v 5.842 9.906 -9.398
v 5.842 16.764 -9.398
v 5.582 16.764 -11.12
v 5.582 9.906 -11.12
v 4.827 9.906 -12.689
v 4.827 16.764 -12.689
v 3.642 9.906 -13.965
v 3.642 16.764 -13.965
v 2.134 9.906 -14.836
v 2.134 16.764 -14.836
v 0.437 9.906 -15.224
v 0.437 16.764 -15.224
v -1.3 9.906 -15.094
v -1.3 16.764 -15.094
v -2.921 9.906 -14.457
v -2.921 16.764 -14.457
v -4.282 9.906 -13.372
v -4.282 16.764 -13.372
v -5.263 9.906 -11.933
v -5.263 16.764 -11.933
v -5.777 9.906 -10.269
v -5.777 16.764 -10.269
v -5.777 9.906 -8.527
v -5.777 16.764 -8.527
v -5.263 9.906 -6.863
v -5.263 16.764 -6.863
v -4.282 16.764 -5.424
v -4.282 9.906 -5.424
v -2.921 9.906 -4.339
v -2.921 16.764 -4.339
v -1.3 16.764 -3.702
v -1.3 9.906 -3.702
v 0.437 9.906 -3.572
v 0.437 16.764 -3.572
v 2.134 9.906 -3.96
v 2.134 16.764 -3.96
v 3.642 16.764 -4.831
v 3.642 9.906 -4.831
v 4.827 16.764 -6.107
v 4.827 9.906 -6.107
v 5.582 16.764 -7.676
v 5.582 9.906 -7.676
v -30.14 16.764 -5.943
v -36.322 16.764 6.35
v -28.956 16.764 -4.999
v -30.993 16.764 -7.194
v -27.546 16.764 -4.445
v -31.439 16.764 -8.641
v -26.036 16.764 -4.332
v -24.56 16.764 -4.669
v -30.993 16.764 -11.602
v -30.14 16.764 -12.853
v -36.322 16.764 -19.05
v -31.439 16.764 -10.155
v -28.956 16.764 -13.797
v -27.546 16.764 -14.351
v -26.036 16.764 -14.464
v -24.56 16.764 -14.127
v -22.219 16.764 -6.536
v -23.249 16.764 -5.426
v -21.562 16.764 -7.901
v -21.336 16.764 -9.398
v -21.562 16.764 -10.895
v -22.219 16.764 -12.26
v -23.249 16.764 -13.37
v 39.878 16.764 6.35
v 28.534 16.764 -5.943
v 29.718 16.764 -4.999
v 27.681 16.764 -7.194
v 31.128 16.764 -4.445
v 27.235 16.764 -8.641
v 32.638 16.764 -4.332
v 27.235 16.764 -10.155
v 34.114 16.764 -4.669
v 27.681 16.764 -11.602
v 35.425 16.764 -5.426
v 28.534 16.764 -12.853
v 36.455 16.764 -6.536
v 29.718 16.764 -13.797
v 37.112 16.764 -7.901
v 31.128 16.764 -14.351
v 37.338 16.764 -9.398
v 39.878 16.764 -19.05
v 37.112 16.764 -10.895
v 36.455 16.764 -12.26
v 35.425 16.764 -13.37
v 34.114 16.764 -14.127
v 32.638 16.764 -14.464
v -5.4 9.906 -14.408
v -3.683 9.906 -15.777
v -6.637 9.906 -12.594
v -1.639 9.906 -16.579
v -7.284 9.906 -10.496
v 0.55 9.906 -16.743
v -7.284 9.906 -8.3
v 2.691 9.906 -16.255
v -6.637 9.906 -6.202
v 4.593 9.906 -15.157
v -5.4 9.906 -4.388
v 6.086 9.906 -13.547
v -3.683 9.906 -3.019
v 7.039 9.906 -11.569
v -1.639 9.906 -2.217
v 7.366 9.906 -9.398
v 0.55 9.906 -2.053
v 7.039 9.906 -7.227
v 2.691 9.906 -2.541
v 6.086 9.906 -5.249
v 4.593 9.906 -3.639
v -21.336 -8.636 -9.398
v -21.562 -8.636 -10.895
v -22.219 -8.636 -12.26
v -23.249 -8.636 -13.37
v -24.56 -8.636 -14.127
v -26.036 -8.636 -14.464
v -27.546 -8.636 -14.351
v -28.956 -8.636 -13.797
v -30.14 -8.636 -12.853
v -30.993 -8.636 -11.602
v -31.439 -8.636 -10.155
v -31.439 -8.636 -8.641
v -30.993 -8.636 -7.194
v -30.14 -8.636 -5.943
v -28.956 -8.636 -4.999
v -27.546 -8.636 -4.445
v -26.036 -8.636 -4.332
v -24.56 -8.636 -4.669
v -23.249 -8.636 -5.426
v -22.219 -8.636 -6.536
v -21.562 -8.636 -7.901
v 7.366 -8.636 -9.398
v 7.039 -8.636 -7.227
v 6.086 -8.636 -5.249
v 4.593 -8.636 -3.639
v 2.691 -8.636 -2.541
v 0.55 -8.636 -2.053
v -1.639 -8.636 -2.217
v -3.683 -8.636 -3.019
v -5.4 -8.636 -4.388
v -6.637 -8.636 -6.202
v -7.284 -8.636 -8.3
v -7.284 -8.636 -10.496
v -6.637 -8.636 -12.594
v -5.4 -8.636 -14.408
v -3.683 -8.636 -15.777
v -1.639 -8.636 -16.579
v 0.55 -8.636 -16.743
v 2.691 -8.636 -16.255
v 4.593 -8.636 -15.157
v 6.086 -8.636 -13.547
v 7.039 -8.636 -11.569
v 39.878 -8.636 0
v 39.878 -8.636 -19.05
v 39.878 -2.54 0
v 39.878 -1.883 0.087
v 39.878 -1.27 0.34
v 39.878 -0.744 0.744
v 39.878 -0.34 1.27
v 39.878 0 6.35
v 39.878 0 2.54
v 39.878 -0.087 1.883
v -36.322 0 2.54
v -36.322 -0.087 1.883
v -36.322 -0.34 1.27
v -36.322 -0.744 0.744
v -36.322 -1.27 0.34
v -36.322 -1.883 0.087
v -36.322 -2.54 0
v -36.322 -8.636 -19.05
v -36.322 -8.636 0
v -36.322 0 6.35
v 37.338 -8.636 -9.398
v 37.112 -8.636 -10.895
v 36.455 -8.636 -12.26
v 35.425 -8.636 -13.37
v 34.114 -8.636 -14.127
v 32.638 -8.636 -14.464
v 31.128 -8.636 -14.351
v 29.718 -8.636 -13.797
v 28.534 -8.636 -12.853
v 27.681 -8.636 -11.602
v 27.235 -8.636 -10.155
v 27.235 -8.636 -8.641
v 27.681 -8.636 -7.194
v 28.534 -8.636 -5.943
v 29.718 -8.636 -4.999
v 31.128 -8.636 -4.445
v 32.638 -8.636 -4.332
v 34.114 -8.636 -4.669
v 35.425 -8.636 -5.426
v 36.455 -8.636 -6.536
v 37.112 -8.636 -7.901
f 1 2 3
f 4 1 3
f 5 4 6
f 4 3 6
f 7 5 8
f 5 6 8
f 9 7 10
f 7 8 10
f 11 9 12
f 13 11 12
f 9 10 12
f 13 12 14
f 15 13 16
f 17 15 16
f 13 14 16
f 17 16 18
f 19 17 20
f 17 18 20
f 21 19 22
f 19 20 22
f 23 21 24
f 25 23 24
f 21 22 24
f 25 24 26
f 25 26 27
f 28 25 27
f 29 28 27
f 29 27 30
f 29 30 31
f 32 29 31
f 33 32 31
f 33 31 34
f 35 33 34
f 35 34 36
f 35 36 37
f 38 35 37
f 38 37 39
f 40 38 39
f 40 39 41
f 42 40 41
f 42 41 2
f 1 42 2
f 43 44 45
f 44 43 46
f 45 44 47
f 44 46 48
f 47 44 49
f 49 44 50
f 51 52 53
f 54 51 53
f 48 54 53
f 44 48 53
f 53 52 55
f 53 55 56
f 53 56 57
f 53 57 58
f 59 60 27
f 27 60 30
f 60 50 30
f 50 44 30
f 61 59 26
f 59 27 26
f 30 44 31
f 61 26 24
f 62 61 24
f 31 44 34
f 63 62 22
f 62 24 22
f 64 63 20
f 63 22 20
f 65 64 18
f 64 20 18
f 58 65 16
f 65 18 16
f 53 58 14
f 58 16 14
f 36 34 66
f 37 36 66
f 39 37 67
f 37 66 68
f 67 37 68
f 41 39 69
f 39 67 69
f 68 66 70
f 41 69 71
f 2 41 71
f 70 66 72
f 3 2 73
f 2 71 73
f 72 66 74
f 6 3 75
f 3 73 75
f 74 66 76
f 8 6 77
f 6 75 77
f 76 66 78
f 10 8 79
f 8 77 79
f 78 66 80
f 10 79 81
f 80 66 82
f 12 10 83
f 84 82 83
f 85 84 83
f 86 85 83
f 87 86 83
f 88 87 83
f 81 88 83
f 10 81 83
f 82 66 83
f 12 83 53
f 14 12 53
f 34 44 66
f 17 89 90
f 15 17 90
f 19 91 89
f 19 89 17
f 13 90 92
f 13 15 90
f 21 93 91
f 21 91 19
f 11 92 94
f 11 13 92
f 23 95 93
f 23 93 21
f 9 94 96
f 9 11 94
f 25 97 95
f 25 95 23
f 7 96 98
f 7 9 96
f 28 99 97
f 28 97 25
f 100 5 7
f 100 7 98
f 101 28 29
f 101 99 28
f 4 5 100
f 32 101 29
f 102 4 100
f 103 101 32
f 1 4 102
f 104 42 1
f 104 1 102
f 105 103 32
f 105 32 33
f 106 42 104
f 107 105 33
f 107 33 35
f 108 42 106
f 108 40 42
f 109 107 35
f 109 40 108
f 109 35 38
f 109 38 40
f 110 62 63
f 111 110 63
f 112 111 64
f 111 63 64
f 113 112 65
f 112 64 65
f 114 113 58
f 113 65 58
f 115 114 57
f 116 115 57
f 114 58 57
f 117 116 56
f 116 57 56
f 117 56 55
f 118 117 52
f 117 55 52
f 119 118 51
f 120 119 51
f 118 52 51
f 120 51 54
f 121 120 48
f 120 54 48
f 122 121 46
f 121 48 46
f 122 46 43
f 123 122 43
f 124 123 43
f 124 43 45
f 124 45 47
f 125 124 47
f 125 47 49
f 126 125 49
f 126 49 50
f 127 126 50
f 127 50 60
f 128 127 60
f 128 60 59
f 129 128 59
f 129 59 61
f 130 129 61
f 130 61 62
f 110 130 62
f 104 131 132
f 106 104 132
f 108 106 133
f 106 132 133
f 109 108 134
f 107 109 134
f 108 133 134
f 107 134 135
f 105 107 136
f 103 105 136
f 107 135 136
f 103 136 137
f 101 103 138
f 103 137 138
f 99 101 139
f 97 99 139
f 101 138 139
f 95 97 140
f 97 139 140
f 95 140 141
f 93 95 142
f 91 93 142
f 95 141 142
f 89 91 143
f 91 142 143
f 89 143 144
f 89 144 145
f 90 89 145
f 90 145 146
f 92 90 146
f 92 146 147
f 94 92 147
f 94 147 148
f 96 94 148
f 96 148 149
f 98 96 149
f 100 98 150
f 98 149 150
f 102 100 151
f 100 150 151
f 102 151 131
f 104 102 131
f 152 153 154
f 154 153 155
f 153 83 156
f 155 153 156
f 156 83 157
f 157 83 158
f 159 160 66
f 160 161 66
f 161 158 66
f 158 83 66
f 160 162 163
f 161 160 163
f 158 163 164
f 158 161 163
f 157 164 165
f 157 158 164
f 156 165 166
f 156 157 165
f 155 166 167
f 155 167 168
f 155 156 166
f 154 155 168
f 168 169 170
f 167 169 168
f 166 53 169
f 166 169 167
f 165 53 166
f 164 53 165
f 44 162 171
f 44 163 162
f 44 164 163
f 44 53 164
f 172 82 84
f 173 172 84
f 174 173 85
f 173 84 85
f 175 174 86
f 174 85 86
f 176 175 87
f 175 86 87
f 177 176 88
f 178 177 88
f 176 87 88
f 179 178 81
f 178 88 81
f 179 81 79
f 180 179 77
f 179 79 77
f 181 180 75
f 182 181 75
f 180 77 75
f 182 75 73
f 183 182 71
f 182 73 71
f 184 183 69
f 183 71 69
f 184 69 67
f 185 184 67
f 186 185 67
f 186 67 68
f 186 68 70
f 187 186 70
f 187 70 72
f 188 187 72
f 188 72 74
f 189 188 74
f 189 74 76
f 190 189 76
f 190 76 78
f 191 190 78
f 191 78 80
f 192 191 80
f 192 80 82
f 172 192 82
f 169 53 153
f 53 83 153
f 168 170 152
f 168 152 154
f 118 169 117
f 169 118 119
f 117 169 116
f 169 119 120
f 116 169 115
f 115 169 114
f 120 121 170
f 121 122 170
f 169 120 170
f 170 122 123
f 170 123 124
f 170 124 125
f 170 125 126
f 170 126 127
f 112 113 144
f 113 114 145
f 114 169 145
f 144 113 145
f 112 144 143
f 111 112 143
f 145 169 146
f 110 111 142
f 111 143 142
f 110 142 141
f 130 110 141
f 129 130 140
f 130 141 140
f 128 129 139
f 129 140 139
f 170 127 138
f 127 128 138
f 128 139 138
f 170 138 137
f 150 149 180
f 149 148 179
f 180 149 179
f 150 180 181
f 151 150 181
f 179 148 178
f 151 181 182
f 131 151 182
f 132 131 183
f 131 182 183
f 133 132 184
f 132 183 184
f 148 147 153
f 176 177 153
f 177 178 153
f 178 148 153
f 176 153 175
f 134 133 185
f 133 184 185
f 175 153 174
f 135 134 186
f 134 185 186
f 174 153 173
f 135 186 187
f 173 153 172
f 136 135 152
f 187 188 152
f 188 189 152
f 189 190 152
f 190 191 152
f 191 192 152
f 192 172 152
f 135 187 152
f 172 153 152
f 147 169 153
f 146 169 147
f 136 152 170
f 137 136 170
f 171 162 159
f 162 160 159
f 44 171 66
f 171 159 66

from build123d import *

# Parameters (mm, degrees)
BOSS_EXTRUDE1_DEPTH      = 39.878
BOSS_EXTRUDE1_DEPTH_BACK = 36.322
FILLET1_R                = 2.54
SKETCH2_R                = 5.08
SKETCH2_R_2              = 5.842
CUT_EXTRUDE1_DEPTH       = 26.4
SKETCH3_R                = 7.366
CUT_EXTRUDE2_DEPTH       = 18.542


with BuildPart() as part:
    # Sketch1 → Boss-Extrude1 (new body, two sides)
    with BuildSketch(Plane(origin=(0, 0, 0), x_dir=(0, 0, -1), z_dir=(1, 0, 0))) as boss_extrude1_sk:
        Polygon((0, 0), (-6.35, 0), (-6.35, 16.764), (19.05, 16.764), (19.05, -8.636), (0, -8.636), align=None)
    extrude(amount=BOSS_EXTRUDE1_DEPTH)
    extrude(boss_extrude1_sk.sketch, amount=-BOSS_EXTRUDE1_DEPTH_BACK)

    # Fillet1
    fillet1_edges = [part.edges().sort_by_distance(p)[0] for p in [
        (1.778, 0, 0),
    ]]
    fillet(fillet1_edges, radius=FILLET1_R)

    # Sketch2 → Cut-Extrude1 (cut, through all)
    with BuildSketch(Plane(origin=(0, 16.764, 0), x_dir=(1, 0, 0), z_dir=(0, 1, 0))):
        with Locations((-26.416, 9.398)):
            Circle(SKETCH2_R)
        with Locations((32.258, 9.398)):
            Circle(SKETCH2_R)
        with Locations((0, 9.398)):
            Circle(SKETCH2_R_2)
    extrude(amount=-CUT_EXTRUDE1_DEPTH, mode=Mode.SUBTRACT)

    # Sketch3 → Cut-Extrude2 (cut)
    with BuildSketch(Plane.XZ.offset(8.636)):
        with Locations((0, -9.398)):
            Circle(SKETCH3_R)
    extrude(amount=-CUT_EXTRUDE2_DEPTH, mode=Mode.SUBTRACT)


solid = part.part
